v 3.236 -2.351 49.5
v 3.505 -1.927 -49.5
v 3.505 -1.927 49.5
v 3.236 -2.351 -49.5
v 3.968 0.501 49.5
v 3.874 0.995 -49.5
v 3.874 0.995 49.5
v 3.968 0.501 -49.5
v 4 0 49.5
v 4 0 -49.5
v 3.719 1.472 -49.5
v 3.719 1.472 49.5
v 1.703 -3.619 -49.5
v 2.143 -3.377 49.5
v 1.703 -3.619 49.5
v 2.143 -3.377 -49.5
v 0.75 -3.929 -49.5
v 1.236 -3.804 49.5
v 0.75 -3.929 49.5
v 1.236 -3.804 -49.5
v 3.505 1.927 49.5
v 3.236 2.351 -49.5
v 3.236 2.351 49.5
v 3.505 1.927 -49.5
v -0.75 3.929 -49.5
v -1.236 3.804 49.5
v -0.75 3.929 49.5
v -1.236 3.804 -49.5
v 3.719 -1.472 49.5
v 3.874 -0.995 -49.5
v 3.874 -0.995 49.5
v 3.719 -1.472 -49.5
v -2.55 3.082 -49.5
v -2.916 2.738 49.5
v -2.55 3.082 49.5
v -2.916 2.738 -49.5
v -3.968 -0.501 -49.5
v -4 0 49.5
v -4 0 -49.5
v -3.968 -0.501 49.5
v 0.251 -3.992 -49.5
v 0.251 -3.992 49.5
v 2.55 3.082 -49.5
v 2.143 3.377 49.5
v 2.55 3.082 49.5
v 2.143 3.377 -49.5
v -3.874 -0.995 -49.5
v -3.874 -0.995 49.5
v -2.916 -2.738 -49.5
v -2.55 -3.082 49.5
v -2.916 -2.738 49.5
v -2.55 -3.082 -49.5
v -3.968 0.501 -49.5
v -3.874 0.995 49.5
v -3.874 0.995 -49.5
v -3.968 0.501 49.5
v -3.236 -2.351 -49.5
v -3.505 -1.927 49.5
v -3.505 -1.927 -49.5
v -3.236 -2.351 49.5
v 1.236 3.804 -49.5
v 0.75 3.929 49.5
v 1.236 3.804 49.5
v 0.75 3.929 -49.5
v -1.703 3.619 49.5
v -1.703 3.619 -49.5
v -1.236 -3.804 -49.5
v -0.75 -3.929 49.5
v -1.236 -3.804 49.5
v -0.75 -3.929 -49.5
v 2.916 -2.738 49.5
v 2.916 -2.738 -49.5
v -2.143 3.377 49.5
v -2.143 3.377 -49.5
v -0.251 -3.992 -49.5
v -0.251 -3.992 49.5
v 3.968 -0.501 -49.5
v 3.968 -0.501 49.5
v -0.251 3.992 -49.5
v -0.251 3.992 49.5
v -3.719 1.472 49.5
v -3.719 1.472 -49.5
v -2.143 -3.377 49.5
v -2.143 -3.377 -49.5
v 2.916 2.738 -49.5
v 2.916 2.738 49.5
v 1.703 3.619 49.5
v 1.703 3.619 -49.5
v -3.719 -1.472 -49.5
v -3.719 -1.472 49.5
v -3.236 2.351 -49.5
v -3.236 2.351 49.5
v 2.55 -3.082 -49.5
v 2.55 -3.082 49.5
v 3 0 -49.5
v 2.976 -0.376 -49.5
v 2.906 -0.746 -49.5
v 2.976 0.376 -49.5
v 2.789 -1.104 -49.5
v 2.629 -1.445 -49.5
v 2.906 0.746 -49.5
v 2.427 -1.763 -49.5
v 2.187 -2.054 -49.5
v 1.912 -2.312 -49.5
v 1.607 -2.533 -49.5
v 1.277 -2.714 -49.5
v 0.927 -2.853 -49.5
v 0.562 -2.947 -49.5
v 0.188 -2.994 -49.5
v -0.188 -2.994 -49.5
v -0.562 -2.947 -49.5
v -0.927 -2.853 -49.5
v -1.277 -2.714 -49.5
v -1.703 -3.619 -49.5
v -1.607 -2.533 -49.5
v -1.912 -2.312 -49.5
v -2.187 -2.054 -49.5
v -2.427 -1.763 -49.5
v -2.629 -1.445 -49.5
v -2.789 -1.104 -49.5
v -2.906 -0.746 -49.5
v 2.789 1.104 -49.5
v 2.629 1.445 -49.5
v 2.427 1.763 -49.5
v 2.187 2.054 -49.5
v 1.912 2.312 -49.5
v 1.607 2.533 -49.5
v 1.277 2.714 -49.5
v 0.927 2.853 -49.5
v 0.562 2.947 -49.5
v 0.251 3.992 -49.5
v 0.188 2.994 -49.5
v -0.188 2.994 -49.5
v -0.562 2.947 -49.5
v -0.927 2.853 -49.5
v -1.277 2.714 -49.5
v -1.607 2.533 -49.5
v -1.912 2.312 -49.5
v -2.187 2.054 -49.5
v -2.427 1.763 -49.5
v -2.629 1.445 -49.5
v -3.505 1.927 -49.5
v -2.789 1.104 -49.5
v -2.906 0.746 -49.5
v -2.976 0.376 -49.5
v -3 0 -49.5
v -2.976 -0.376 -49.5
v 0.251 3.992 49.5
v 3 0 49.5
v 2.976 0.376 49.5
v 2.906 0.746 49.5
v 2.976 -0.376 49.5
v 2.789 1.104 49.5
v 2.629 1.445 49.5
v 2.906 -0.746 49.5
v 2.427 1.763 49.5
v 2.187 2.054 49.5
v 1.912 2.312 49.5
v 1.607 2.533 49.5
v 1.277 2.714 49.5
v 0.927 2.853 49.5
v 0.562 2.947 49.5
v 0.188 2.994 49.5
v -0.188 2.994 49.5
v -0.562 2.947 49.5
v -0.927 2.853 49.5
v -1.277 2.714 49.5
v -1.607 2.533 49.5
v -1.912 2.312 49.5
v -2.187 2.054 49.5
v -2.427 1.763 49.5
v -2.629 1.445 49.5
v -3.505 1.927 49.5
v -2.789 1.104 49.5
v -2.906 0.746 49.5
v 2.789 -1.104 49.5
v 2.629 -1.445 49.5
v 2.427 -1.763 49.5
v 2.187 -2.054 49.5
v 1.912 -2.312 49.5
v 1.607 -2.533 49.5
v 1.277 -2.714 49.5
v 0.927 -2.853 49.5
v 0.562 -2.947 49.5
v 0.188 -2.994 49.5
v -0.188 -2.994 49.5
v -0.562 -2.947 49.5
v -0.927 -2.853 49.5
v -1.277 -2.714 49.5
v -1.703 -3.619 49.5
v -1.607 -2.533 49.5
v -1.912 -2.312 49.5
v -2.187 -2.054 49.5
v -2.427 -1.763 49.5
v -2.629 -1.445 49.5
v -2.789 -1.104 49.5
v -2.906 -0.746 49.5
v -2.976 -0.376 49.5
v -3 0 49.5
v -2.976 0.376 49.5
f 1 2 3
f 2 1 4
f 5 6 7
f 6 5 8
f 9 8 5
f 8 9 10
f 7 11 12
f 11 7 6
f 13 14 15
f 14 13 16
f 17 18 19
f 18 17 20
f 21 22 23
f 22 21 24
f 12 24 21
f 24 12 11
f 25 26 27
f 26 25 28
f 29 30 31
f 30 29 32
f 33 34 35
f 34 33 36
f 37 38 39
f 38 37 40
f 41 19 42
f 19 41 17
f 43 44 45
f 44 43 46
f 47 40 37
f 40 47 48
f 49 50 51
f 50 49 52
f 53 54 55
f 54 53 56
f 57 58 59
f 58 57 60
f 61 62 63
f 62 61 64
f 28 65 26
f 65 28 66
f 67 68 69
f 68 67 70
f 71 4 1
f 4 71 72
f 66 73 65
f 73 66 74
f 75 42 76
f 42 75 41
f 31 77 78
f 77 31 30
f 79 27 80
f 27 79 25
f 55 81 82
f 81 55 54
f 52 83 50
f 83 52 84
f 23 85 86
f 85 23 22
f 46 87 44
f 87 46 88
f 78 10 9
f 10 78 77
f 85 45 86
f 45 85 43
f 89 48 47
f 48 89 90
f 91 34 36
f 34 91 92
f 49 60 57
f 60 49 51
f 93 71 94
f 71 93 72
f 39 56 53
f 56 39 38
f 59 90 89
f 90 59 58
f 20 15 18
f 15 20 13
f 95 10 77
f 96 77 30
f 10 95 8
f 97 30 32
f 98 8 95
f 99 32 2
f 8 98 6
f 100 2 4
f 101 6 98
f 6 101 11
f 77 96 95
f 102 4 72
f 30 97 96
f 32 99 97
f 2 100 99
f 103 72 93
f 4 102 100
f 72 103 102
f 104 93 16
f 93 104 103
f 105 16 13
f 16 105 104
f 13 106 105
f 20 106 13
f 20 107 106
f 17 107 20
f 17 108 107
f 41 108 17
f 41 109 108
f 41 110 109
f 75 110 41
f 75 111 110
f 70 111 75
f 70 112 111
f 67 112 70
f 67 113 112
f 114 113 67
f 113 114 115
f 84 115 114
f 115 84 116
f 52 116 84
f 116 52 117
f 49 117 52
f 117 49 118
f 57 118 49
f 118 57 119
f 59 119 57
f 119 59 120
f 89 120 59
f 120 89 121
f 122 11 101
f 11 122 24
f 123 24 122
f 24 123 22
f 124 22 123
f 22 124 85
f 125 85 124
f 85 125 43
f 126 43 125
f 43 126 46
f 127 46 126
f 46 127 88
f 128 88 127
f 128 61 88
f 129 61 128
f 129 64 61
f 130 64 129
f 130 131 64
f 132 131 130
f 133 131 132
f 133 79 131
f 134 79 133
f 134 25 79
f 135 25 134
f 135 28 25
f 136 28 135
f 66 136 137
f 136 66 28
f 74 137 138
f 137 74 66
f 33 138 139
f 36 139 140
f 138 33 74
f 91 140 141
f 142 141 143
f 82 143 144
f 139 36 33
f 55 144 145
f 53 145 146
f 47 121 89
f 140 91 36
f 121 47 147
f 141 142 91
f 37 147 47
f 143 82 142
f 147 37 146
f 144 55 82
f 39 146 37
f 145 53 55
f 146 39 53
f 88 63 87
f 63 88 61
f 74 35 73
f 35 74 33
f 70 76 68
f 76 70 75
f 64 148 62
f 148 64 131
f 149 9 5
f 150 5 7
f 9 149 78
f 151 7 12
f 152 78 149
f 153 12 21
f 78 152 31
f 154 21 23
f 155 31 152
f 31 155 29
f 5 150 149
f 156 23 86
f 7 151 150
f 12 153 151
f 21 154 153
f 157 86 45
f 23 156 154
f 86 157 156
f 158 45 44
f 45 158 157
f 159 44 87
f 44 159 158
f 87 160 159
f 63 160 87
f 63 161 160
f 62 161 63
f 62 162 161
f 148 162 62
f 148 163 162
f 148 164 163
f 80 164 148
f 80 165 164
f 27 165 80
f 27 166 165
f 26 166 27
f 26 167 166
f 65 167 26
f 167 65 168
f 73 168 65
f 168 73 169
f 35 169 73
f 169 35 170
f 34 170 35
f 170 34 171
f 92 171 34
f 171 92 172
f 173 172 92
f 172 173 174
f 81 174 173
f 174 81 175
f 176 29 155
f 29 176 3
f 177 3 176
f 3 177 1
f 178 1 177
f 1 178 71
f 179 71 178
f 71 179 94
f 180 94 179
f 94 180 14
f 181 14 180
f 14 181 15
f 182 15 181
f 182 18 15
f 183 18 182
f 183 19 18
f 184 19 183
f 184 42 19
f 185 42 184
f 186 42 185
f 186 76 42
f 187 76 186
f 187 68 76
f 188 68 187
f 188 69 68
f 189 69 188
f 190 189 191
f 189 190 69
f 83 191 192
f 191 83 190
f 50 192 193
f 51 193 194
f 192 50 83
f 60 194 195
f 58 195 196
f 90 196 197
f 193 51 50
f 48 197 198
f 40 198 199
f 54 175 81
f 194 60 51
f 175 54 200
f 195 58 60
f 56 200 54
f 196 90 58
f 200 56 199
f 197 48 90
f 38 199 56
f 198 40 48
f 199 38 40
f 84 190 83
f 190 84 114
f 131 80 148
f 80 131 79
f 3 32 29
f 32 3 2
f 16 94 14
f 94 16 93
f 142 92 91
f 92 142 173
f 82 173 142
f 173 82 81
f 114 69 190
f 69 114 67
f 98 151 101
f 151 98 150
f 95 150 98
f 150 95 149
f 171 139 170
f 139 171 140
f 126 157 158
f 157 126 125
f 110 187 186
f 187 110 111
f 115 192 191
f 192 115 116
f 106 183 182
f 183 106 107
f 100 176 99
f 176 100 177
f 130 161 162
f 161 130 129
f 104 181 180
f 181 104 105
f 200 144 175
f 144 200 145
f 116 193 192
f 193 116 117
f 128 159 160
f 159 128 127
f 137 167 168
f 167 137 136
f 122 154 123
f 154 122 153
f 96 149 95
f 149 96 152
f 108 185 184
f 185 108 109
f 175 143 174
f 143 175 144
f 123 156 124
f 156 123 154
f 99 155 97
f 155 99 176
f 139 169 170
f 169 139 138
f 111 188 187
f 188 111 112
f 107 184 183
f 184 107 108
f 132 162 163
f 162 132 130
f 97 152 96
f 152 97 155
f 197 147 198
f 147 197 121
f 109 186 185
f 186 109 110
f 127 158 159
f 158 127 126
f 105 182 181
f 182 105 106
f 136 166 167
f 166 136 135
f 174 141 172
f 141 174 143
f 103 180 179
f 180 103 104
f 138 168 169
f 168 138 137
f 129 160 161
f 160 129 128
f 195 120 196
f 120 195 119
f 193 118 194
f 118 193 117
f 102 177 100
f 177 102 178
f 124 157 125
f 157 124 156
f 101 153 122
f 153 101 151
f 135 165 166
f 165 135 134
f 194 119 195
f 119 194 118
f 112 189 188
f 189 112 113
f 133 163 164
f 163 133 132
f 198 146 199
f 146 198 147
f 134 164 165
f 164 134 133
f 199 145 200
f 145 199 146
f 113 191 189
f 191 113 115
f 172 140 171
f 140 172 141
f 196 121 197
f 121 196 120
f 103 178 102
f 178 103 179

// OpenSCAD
$fn = 50;


difference() {
	union() {
		translate(v = [0, 0, -49.5000000000]) {
			cylinder(h = 99, r = 4.0000000000);
		}
	}
	union() {
		translate(v = [0, 0, -100.0000000000]) {
			cylinder(h = 200, r = 3.0000000000);
		}
	}
}
